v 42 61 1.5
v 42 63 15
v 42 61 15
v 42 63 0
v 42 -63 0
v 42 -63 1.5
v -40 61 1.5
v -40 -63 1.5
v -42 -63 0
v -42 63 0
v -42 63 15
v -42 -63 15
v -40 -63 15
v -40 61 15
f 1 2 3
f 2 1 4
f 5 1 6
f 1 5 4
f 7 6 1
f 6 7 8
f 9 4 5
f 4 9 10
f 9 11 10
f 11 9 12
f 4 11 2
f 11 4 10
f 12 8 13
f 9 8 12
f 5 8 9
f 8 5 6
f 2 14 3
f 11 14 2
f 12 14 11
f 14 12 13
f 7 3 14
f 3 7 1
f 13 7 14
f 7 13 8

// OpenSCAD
$fn = 50;


difference() {
	union() {
		translate(v = [-42.0000000000, -63.0000000000, 0]) {
			cube(size = [84, 126, 1.5000000000]);
		}
		translate(v = [-42.0000000000, 61.0000000000, 0]) {
			cube(size = [84, 2, 15]);
		}
		translate(v = [-42.0000000000, -63.0000000000, 0]) {
			cube(size = [2, 126, 15]);
		}
	}
	union();
}
